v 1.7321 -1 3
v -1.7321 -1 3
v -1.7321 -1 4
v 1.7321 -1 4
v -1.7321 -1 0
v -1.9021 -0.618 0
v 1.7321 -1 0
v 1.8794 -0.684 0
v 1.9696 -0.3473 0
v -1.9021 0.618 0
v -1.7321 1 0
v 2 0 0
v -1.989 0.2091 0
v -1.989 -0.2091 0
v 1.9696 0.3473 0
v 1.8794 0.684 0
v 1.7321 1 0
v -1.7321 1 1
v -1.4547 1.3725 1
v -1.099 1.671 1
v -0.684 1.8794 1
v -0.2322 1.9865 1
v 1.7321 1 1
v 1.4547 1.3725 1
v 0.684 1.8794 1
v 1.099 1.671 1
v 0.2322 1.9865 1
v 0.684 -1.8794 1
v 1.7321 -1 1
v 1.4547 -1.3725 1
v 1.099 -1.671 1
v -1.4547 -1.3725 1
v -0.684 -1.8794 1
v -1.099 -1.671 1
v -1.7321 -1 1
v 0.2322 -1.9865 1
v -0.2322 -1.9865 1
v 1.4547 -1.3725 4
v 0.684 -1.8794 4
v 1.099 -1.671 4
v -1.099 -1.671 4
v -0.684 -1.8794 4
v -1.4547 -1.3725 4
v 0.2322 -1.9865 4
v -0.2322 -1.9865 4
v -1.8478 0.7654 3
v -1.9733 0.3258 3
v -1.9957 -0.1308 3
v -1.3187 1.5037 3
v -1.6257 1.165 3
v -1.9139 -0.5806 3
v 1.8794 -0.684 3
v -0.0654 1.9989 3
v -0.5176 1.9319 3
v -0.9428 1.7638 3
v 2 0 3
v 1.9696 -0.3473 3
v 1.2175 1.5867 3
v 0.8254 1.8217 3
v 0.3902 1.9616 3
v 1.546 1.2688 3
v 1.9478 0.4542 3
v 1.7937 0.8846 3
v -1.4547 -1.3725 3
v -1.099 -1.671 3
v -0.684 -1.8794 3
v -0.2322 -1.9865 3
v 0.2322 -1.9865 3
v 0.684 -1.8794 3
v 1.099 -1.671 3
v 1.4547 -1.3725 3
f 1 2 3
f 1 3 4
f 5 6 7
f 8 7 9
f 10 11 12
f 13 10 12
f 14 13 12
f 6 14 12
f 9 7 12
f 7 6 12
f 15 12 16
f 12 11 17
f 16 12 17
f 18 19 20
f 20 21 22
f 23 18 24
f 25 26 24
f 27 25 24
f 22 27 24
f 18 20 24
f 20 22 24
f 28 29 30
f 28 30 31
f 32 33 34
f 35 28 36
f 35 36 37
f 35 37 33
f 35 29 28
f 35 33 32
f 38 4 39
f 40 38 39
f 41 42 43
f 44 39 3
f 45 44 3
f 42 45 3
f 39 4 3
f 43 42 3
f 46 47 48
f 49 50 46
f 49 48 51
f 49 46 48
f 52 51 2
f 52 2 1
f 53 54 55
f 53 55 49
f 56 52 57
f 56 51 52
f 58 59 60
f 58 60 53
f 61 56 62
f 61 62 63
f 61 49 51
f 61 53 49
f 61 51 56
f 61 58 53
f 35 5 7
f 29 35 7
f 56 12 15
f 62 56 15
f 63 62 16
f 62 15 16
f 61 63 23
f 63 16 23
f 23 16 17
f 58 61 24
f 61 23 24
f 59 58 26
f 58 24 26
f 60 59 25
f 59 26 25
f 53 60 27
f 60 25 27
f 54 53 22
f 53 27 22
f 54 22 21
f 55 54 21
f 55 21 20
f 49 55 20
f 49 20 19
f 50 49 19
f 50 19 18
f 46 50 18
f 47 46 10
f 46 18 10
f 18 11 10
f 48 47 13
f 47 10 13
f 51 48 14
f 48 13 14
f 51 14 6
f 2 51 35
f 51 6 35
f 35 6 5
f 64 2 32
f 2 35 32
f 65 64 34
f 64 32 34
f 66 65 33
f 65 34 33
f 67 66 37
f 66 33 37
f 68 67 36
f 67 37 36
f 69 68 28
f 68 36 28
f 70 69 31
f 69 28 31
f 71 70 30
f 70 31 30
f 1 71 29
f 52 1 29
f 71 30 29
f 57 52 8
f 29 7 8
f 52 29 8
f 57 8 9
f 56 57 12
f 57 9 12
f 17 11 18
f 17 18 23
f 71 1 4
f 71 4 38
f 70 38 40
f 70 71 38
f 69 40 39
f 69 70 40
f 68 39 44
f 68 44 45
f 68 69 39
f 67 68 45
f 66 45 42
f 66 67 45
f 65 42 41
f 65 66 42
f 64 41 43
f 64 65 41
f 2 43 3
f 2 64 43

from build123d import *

# Parameters (mm, degrees)
SKETCH1_R           = 2
BOSS_EXTRUDE1_DEPTH = 3
BOSS_EXTRUDE2_DEPTH = 1
CUT_EXTRUDE1_DEPTH  = 1
CUT_EXTRUDE2_DEPTH  = 1


with BuildPart() as part:
    # Sketch1 → Boss-Extrude1 (new body)
    with BuildSketch(Plane.XY):
        Circle(SKETCH1_R)
    extrude(amount=BOSS_EXTRUDE1_DEPTH)

    # Sketch2 → Boss-Extrude2 (add)
    with BuildSketch(Plane.XY.offset(3)):
        with BuildLine():
            Line((-1.732050808, -1), (1.732050808, -1))
            ThreePointArc((1.732050808, -1), (0, -2), (-1.732050808, -1))
        make_face()
    extrude(amount=BOSS_EXTRUDE2_DEPTH)

    # Sketch3 → Cut-Extrude1 (cut)
    with BuildSketch(Plane(origin=(0, 0, 0), x_dir=(-1, 0, 0), z_dir=(0, 0, -1))):
        with BuildLine():
            Line((1.732050808, 1), (-1.732050808, 1))
            ThreePointArc((-1.732050808, 1), (0, 2), (1.732050808, 1))
        make_face()
    extrude(amount=-CUT_EXTRUDE1_DEPTH, mode=Mode.SUBTRACT)

    # Sketch4 → Cut-Extrude2 (cut)
    with BuildSketch(Plane(origin=(0, 0, 0), x_dir=(-1, 0, 0), z_dir=(0, 0, -1))):
        with BuildLine():
            Line((1.732050808, -1), (-1.732050808, -1))
            ThreePointArc((-1.732050808, -1), (0, -2), (1.732050808, -1))
        make_face()
    extrude(amount=-CUT_EXTRUDE2_DEPTH, mode=Mode.SUBTRACT)


solid = part.part
